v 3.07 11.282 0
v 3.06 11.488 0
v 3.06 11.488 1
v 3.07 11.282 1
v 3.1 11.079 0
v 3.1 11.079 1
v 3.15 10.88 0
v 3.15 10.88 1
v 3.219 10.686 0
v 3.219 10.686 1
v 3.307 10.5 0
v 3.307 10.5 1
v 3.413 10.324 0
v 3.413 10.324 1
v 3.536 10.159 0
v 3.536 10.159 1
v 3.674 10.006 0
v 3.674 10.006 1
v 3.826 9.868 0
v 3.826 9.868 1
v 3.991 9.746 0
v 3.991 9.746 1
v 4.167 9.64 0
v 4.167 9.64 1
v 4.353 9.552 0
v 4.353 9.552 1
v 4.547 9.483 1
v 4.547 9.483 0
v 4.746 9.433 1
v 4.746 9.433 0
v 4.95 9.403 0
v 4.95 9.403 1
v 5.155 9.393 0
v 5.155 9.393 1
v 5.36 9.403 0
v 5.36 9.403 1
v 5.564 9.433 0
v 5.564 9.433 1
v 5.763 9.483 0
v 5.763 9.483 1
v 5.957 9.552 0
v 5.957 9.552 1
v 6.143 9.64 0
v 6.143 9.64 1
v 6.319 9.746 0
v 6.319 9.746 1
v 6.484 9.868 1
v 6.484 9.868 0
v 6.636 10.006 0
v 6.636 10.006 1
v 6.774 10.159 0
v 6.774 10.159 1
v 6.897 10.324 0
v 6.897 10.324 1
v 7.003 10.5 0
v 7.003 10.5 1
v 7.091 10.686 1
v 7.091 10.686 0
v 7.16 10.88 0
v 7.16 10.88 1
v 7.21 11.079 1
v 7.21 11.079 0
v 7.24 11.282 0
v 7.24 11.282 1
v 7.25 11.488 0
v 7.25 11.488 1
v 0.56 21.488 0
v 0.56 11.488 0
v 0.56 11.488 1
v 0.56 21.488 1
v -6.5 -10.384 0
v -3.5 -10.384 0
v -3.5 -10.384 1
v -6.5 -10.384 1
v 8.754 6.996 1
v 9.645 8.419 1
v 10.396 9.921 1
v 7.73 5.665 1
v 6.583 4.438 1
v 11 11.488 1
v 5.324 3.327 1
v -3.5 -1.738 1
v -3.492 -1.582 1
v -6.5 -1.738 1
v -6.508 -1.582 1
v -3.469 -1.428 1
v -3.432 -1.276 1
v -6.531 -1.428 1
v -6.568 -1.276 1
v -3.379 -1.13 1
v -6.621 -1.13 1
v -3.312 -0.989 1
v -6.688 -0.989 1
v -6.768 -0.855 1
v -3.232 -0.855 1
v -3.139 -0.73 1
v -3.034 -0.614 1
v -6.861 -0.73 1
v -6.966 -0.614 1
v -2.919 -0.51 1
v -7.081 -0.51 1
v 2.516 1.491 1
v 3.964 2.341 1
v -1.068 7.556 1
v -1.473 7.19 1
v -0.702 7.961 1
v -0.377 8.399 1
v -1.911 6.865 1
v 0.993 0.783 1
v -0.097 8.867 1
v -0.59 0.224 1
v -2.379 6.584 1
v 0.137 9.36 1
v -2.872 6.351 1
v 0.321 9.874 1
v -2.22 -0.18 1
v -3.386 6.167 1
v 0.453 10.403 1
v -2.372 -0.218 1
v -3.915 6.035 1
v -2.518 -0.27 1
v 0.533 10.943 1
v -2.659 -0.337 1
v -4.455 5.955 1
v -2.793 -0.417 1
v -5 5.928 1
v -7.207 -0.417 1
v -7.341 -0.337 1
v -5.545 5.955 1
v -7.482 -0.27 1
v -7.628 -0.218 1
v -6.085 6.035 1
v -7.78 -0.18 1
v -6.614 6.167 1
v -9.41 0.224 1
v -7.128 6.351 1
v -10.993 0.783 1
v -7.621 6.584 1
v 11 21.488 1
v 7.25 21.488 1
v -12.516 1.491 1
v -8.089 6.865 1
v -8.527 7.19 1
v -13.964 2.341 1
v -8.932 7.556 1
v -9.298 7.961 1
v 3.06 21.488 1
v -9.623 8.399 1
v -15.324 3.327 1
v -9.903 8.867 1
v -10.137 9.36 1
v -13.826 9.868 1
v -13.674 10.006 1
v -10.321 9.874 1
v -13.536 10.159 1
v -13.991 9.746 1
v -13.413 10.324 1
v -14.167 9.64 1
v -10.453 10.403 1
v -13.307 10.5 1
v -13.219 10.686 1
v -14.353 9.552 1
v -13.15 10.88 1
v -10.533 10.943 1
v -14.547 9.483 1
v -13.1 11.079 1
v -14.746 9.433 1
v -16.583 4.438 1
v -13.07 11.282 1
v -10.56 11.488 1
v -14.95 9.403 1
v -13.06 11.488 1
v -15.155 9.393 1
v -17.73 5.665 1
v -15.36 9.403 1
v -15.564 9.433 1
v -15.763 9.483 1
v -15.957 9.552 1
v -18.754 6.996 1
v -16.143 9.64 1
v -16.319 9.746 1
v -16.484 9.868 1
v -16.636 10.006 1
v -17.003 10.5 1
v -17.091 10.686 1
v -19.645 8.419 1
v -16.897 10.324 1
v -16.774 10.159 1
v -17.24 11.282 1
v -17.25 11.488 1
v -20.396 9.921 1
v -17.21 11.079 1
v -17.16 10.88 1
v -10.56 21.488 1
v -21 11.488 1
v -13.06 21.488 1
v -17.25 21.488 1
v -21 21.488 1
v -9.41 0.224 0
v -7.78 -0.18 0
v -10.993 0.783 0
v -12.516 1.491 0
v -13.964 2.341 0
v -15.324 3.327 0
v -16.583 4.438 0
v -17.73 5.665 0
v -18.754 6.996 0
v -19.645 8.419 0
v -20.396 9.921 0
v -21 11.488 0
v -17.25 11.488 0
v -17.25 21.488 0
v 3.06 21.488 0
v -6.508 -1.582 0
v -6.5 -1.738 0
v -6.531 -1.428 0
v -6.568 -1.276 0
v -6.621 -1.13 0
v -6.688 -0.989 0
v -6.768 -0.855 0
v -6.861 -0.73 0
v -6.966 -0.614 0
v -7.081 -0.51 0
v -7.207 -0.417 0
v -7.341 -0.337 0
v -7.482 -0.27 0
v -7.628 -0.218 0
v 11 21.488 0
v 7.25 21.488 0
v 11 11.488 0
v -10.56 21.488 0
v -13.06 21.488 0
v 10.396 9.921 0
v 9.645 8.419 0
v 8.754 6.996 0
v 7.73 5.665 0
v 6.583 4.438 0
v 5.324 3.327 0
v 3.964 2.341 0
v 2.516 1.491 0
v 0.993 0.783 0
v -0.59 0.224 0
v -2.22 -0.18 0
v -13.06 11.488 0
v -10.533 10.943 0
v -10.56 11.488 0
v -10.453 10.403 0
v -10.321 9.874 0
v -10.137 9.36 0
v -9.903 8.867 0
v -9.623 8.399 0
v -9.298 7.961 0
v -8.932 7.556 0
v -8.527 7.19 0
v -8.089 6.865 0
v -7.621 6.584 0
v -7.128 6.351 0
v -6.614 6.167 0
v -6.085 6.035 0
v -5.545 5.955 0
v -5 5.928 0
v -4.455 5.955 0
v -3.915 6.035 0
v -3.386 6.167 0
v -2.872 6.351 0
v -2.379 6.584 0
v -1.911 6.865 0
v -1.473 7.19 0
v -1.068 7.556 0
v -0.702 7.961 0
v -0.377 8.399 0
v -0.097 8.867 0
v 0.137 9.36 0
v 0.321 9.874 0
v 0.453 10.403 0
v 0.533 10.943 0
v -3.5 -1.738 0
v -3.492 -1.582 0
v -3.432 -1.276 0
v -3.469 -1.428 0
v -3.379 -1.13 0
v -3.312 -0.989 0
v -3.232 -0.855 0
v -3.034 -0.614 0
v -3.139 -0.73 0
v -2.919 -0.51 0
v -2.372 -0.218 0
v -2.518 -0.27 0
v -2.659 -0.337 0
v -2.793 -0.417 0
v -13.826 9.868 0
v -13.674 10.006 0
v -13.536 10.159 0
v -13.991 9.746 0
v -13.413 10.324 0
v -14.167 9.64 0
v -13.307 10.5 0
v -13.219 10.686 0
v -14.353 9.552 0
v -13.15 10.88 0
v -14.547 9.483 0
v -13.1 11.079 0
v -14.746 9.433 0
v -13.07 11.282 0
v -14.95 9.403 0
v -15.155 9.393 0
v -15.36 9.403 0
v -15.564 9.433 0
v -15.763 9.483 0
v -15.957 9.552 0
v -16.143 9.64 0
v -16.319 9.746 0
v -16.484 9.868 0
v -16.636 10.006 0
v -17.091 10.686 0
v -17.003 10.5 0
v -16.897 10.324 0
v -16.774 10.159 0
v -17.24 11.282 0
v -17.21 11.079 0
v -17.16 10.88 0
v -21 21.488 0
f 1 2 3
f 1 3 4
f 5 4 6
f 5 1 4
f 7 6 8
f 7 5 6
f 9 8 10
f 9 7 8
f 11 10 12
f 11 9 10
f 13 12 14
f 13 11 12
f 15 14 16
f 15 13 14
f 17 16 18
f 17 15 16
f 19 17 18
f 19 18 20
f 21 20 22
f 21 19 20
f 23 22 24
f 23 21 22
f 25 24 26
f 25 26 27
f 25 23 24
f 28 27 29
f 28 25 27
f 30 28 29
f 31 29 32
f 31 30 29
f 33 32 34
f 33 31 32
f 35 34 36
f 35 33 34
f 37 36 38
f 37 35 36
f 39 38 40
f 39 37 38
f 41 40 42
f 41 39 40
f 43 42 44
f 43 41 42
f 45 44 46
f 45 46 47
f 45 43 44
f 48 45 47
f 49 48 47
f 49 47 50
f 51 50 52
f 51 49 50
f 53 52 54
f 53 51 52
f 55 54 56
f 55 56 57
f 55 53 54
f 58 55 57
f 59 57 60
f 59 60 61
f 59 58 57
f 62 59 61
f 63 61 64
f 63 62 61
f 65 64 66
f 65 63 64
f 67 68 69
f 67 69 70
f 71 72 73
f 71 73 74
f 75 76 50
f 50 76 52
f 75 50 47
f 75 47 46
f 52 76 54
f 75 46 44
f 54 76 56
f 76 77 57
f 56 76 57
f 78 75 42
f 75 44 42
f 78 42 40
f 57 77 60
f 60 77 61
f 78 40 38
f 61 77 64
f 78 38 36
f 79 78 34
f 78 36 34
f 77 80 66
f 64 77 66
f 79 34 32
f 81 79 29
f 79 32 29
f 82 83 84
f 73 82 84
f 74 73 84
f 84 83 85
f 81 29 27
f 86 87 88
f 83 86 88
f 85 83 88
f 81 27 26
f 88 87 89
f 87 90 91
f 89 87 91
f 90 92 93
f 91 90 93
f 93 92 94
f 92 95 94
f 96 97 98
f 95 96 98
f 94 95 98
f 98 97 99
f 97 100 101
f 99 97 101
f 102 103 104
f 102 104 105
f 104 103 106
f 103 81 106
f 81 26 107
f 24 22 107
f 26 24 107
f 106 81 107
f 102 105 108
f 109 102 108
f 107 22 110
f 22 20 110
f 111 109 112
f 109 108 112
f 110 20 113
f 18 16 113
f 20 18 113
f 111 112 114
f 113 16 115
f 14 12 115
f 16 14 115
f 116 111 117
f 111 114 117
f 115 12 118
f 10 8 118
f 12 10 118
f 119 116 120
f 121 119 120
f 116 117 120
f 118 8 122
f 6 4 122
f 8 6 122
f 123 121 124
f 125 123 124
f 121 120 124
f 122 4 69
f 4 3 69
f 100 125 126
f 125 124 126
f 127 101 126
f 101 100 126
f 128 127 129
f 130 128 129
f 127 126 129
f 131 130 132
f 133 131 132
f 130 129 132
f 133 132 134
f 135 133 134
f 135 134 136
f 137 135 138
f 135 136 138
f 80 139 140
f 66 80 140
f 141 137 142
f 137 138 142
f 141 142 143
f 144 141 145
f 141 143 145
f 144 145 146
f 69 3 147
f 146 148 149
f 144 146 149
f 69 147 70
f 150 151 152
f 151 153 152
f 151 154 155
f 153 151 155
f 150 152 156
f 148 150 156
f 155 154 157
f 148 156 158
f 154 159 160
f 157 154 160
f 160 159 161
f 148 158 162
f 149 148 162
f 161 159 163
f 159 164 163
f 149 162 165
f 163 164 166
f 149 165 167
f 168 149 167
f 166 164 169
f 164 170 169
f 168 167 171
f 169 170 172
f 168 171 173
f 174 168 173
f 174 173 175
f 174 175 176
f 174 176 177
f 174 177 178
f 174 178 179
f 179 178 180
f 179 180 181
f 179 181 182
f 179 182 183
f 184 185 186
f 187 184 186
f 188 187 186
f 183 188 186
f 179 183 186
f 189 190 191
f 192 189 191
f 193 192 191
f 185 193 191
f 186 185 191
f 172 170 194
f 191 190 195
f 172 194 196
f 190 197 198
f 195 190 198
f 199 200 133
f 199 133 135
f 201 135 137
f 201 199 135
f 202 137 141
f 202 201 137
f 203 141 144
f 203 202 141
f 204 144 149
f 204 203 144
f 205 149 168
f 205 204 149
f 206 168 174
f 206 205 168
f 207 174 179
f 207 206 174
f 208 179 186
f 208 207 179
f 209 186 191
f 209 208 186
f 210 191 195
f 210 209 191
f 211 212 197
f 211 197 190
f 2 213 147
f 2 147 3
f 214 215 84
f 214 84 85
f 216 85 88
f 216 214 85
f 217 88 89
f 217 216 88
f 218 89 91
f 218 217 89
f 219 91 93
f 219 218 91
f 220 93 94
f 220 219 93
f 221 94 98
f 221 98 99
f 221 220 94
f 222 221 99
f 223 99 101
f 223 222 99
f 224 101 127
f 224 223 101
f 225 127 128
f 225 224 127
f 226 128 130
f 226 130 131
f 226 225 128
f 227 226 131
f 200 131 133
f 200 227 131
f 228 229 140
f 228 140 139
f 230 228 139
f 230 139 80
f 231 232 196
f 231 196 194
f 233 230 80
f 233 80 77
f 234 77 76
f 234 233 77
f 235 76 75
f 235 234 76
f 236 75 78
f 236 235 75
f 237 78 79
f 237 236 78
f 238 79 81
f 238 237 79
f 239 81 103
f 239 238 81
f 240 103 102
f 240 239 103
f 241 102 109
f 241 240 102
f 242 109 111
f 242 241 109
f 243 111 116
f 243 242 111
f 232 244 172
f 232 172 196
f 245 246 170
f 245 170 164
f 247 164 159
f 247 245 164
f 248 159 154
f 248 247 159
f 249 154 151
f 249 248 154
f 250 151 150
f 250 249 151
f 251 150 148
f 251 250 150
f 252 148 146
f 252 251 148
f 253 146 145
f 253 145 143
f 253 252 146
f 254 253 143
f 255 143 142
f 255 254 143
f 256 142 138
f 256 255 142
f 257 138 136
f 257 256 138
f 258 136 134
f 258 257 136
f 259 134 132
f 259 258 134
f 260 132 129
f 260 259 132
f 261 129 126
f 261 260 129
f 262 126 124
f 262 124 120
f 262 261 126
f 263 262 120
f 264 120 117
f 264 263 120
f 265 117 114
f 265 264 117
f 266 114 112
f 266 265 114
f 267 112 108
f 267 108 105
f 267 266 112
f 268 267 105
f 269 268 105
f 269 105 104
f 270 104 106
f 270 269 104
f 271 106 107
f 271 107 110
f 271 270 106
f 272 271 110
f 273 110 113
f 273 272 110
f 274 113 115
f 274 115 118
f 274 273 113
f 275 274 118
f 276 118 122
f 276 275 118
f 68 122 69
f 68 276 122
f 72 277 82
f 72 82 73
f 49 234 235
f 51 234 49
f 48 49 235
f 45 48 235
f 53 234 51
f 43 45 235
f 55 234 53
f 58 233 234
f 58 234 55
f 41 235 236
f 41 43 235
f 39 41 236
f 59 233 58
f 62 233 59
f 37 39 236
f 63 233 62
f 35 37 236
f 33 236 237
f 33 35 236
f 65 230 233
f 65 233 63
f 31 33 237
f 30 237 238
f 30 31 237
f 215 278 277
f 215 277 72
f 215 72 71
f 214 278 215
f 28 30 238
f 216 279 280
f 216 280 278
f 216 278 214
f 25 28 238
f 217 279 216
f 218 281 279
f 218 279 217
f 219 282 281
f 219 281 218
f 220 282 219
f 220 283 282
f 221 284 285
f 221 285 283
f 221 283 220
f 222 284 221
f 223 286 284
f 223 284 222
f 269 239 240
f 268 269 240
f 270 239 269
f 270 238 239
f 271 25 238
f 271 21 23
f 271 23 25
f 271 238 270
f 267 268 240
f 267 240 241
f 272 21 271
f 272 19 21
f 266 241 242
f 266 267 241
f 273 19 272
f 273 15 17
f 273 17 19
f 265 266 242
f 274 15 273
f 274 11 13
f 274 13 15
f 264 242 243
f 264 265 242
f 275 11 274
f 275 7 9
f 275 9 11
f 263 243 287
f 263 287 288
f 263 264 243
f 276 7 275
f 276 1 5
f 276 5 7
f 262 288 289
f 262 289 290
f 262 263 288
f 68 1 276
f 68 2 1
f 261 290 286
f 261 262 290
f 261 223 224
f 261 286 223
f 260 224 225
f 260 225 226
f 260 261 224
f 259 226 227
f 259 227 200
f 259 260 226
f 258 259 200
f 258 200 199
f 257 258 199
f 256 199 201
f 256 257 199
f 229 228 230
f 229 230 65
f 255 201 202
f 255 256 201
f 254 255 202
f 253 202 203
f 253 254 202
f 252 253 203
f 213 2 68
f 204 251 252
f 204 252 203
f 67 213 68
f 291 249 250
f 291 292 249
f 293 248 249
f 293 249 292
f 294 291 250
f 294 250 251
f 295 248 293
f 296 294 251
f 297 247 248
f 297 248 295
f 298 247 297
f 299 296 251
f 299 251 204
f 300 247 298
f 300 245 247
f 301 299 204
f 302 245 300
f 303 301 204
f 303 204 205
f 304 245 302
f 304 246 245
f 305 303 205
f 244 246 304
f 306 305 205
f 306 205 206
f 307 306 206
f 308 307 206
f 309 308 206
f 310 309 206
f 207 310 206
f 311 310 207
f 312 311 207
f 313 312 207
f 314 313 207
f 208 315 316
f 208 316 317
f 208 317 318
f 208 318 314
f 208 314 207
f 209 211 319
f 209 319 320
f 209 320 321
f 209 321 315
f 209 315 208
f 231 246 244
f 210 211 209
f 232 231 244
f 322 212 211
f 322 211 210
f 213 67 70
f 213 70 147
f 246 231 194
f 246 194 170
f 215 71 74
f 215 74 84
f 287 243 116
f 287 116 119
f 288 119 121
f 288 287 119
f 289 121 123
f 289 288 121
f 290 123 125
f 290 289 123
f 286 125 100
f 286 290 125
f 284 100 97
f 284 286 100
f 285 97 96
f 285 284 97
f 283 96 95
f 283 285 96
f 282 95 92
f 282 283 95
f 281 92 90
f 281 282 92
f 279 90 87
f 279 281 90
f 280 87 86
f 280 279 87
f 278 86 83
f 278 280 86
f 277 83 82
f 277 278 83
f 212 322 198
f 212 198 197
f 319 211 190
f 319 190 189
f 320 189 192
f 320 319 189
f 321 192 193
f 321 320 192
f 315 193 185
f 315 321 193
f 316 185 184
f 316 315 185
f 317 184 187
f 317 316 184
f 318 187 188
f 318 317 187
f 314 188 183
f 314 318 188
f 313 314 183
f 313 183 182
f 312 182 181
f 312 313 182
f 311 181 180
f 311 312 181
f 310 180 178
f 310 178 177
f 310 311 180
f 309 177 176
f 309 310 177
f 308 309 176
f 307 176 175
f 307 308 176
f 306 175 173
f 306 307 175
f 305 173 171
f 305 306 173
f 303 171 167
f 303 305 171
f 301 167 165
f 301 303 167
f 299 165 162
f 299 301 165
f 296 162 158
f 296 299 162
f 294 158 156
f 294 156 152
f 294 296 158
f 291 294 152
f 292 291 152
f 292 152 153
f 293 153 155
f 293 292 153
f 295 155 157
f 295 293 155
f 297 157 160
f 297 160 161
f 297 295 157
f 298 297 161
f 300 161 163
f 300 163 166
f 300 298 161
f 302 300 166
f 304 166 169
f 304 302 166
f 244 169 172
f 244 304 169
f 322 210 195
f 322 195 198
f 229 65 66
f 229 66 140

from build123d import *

# Parameters (mm, degrees)
BOSS_EXTRUDE2_DEPTH = 1


with BuildPart() as part:
    # Sketch2 → Boss-Extrude2 (new body)
    with BuildSketch(Plane.XY):
        with BuildLine():
            Line((-21, 21.487770019), (-17.25, 21.487770019))
            Line((-17.25, 21.487770019), (-17.25, 11.487770019))
            ThreePointArc((-17.25, 11.487770019), (-15.155, 9.392770019), (-13.06, 11.487770019))
            Line((-13.06, 11.487770019), (-13.06, 21.487770019))
            Line((-13.06, 21.487770019), (-10.56, 21.487770019))
            Line((-10.56, 21.487770019), (-10.56, 11.487770019))
            ThreePointArc((-10.56, 11.487770019), (-5, 5.927770019), (0.56, 11.487770019))
            Line((0.56, 11.487770019), (0.56, 21.487770019))
            Line((0.56, 21.487770019), (3.06, 21.487770019))
            Line((3.06, 21.487770019), (3.06, 11.487770019))
            ThreePointArc((3.06, 11.487770019), (5.155, 9.392770019), (7.25, 11.487770019))
            Line((7.25, 11.487770019), (7.25, 21.487770019))
            Line((7.25, 21.487770019), (11, 21.487770019))
            Line((11, 21.487770019), (11, 11.487770019))
            ThreePointArc((11, 11.487770019), (5.966787544, 3.86706946), (-2.220289758, -0.18016044))
            ThreePointArc((-2.220289758, -0.18016044), (-3.139034242, -0.72968283), (-3.5, -1.737536988))
            Line((-3.5, -1.737536988), (-3.5, -10.384166662))
            Line((-3.5, -10.384166662), (-6.5, -10.384166662))
            Line((-6.5, -10.384166662), (-6.5, -1.737536988))
            ThreePointArc((-6.5, -1.737536988), (-6.860965758, -0.72968283), (-7.779710242, -0.18016044))
            ThreePointArc((-7.779710242, -0.18016044), (-15.966787544, 3.86706946), (-21, 11.487770019))
            Line((-21, 11.487770019), (-21, 21.487770019))
        make_face()
    extrude(amount=BOSS_EXTRUDE2_DEPTH)


solid = part.part
